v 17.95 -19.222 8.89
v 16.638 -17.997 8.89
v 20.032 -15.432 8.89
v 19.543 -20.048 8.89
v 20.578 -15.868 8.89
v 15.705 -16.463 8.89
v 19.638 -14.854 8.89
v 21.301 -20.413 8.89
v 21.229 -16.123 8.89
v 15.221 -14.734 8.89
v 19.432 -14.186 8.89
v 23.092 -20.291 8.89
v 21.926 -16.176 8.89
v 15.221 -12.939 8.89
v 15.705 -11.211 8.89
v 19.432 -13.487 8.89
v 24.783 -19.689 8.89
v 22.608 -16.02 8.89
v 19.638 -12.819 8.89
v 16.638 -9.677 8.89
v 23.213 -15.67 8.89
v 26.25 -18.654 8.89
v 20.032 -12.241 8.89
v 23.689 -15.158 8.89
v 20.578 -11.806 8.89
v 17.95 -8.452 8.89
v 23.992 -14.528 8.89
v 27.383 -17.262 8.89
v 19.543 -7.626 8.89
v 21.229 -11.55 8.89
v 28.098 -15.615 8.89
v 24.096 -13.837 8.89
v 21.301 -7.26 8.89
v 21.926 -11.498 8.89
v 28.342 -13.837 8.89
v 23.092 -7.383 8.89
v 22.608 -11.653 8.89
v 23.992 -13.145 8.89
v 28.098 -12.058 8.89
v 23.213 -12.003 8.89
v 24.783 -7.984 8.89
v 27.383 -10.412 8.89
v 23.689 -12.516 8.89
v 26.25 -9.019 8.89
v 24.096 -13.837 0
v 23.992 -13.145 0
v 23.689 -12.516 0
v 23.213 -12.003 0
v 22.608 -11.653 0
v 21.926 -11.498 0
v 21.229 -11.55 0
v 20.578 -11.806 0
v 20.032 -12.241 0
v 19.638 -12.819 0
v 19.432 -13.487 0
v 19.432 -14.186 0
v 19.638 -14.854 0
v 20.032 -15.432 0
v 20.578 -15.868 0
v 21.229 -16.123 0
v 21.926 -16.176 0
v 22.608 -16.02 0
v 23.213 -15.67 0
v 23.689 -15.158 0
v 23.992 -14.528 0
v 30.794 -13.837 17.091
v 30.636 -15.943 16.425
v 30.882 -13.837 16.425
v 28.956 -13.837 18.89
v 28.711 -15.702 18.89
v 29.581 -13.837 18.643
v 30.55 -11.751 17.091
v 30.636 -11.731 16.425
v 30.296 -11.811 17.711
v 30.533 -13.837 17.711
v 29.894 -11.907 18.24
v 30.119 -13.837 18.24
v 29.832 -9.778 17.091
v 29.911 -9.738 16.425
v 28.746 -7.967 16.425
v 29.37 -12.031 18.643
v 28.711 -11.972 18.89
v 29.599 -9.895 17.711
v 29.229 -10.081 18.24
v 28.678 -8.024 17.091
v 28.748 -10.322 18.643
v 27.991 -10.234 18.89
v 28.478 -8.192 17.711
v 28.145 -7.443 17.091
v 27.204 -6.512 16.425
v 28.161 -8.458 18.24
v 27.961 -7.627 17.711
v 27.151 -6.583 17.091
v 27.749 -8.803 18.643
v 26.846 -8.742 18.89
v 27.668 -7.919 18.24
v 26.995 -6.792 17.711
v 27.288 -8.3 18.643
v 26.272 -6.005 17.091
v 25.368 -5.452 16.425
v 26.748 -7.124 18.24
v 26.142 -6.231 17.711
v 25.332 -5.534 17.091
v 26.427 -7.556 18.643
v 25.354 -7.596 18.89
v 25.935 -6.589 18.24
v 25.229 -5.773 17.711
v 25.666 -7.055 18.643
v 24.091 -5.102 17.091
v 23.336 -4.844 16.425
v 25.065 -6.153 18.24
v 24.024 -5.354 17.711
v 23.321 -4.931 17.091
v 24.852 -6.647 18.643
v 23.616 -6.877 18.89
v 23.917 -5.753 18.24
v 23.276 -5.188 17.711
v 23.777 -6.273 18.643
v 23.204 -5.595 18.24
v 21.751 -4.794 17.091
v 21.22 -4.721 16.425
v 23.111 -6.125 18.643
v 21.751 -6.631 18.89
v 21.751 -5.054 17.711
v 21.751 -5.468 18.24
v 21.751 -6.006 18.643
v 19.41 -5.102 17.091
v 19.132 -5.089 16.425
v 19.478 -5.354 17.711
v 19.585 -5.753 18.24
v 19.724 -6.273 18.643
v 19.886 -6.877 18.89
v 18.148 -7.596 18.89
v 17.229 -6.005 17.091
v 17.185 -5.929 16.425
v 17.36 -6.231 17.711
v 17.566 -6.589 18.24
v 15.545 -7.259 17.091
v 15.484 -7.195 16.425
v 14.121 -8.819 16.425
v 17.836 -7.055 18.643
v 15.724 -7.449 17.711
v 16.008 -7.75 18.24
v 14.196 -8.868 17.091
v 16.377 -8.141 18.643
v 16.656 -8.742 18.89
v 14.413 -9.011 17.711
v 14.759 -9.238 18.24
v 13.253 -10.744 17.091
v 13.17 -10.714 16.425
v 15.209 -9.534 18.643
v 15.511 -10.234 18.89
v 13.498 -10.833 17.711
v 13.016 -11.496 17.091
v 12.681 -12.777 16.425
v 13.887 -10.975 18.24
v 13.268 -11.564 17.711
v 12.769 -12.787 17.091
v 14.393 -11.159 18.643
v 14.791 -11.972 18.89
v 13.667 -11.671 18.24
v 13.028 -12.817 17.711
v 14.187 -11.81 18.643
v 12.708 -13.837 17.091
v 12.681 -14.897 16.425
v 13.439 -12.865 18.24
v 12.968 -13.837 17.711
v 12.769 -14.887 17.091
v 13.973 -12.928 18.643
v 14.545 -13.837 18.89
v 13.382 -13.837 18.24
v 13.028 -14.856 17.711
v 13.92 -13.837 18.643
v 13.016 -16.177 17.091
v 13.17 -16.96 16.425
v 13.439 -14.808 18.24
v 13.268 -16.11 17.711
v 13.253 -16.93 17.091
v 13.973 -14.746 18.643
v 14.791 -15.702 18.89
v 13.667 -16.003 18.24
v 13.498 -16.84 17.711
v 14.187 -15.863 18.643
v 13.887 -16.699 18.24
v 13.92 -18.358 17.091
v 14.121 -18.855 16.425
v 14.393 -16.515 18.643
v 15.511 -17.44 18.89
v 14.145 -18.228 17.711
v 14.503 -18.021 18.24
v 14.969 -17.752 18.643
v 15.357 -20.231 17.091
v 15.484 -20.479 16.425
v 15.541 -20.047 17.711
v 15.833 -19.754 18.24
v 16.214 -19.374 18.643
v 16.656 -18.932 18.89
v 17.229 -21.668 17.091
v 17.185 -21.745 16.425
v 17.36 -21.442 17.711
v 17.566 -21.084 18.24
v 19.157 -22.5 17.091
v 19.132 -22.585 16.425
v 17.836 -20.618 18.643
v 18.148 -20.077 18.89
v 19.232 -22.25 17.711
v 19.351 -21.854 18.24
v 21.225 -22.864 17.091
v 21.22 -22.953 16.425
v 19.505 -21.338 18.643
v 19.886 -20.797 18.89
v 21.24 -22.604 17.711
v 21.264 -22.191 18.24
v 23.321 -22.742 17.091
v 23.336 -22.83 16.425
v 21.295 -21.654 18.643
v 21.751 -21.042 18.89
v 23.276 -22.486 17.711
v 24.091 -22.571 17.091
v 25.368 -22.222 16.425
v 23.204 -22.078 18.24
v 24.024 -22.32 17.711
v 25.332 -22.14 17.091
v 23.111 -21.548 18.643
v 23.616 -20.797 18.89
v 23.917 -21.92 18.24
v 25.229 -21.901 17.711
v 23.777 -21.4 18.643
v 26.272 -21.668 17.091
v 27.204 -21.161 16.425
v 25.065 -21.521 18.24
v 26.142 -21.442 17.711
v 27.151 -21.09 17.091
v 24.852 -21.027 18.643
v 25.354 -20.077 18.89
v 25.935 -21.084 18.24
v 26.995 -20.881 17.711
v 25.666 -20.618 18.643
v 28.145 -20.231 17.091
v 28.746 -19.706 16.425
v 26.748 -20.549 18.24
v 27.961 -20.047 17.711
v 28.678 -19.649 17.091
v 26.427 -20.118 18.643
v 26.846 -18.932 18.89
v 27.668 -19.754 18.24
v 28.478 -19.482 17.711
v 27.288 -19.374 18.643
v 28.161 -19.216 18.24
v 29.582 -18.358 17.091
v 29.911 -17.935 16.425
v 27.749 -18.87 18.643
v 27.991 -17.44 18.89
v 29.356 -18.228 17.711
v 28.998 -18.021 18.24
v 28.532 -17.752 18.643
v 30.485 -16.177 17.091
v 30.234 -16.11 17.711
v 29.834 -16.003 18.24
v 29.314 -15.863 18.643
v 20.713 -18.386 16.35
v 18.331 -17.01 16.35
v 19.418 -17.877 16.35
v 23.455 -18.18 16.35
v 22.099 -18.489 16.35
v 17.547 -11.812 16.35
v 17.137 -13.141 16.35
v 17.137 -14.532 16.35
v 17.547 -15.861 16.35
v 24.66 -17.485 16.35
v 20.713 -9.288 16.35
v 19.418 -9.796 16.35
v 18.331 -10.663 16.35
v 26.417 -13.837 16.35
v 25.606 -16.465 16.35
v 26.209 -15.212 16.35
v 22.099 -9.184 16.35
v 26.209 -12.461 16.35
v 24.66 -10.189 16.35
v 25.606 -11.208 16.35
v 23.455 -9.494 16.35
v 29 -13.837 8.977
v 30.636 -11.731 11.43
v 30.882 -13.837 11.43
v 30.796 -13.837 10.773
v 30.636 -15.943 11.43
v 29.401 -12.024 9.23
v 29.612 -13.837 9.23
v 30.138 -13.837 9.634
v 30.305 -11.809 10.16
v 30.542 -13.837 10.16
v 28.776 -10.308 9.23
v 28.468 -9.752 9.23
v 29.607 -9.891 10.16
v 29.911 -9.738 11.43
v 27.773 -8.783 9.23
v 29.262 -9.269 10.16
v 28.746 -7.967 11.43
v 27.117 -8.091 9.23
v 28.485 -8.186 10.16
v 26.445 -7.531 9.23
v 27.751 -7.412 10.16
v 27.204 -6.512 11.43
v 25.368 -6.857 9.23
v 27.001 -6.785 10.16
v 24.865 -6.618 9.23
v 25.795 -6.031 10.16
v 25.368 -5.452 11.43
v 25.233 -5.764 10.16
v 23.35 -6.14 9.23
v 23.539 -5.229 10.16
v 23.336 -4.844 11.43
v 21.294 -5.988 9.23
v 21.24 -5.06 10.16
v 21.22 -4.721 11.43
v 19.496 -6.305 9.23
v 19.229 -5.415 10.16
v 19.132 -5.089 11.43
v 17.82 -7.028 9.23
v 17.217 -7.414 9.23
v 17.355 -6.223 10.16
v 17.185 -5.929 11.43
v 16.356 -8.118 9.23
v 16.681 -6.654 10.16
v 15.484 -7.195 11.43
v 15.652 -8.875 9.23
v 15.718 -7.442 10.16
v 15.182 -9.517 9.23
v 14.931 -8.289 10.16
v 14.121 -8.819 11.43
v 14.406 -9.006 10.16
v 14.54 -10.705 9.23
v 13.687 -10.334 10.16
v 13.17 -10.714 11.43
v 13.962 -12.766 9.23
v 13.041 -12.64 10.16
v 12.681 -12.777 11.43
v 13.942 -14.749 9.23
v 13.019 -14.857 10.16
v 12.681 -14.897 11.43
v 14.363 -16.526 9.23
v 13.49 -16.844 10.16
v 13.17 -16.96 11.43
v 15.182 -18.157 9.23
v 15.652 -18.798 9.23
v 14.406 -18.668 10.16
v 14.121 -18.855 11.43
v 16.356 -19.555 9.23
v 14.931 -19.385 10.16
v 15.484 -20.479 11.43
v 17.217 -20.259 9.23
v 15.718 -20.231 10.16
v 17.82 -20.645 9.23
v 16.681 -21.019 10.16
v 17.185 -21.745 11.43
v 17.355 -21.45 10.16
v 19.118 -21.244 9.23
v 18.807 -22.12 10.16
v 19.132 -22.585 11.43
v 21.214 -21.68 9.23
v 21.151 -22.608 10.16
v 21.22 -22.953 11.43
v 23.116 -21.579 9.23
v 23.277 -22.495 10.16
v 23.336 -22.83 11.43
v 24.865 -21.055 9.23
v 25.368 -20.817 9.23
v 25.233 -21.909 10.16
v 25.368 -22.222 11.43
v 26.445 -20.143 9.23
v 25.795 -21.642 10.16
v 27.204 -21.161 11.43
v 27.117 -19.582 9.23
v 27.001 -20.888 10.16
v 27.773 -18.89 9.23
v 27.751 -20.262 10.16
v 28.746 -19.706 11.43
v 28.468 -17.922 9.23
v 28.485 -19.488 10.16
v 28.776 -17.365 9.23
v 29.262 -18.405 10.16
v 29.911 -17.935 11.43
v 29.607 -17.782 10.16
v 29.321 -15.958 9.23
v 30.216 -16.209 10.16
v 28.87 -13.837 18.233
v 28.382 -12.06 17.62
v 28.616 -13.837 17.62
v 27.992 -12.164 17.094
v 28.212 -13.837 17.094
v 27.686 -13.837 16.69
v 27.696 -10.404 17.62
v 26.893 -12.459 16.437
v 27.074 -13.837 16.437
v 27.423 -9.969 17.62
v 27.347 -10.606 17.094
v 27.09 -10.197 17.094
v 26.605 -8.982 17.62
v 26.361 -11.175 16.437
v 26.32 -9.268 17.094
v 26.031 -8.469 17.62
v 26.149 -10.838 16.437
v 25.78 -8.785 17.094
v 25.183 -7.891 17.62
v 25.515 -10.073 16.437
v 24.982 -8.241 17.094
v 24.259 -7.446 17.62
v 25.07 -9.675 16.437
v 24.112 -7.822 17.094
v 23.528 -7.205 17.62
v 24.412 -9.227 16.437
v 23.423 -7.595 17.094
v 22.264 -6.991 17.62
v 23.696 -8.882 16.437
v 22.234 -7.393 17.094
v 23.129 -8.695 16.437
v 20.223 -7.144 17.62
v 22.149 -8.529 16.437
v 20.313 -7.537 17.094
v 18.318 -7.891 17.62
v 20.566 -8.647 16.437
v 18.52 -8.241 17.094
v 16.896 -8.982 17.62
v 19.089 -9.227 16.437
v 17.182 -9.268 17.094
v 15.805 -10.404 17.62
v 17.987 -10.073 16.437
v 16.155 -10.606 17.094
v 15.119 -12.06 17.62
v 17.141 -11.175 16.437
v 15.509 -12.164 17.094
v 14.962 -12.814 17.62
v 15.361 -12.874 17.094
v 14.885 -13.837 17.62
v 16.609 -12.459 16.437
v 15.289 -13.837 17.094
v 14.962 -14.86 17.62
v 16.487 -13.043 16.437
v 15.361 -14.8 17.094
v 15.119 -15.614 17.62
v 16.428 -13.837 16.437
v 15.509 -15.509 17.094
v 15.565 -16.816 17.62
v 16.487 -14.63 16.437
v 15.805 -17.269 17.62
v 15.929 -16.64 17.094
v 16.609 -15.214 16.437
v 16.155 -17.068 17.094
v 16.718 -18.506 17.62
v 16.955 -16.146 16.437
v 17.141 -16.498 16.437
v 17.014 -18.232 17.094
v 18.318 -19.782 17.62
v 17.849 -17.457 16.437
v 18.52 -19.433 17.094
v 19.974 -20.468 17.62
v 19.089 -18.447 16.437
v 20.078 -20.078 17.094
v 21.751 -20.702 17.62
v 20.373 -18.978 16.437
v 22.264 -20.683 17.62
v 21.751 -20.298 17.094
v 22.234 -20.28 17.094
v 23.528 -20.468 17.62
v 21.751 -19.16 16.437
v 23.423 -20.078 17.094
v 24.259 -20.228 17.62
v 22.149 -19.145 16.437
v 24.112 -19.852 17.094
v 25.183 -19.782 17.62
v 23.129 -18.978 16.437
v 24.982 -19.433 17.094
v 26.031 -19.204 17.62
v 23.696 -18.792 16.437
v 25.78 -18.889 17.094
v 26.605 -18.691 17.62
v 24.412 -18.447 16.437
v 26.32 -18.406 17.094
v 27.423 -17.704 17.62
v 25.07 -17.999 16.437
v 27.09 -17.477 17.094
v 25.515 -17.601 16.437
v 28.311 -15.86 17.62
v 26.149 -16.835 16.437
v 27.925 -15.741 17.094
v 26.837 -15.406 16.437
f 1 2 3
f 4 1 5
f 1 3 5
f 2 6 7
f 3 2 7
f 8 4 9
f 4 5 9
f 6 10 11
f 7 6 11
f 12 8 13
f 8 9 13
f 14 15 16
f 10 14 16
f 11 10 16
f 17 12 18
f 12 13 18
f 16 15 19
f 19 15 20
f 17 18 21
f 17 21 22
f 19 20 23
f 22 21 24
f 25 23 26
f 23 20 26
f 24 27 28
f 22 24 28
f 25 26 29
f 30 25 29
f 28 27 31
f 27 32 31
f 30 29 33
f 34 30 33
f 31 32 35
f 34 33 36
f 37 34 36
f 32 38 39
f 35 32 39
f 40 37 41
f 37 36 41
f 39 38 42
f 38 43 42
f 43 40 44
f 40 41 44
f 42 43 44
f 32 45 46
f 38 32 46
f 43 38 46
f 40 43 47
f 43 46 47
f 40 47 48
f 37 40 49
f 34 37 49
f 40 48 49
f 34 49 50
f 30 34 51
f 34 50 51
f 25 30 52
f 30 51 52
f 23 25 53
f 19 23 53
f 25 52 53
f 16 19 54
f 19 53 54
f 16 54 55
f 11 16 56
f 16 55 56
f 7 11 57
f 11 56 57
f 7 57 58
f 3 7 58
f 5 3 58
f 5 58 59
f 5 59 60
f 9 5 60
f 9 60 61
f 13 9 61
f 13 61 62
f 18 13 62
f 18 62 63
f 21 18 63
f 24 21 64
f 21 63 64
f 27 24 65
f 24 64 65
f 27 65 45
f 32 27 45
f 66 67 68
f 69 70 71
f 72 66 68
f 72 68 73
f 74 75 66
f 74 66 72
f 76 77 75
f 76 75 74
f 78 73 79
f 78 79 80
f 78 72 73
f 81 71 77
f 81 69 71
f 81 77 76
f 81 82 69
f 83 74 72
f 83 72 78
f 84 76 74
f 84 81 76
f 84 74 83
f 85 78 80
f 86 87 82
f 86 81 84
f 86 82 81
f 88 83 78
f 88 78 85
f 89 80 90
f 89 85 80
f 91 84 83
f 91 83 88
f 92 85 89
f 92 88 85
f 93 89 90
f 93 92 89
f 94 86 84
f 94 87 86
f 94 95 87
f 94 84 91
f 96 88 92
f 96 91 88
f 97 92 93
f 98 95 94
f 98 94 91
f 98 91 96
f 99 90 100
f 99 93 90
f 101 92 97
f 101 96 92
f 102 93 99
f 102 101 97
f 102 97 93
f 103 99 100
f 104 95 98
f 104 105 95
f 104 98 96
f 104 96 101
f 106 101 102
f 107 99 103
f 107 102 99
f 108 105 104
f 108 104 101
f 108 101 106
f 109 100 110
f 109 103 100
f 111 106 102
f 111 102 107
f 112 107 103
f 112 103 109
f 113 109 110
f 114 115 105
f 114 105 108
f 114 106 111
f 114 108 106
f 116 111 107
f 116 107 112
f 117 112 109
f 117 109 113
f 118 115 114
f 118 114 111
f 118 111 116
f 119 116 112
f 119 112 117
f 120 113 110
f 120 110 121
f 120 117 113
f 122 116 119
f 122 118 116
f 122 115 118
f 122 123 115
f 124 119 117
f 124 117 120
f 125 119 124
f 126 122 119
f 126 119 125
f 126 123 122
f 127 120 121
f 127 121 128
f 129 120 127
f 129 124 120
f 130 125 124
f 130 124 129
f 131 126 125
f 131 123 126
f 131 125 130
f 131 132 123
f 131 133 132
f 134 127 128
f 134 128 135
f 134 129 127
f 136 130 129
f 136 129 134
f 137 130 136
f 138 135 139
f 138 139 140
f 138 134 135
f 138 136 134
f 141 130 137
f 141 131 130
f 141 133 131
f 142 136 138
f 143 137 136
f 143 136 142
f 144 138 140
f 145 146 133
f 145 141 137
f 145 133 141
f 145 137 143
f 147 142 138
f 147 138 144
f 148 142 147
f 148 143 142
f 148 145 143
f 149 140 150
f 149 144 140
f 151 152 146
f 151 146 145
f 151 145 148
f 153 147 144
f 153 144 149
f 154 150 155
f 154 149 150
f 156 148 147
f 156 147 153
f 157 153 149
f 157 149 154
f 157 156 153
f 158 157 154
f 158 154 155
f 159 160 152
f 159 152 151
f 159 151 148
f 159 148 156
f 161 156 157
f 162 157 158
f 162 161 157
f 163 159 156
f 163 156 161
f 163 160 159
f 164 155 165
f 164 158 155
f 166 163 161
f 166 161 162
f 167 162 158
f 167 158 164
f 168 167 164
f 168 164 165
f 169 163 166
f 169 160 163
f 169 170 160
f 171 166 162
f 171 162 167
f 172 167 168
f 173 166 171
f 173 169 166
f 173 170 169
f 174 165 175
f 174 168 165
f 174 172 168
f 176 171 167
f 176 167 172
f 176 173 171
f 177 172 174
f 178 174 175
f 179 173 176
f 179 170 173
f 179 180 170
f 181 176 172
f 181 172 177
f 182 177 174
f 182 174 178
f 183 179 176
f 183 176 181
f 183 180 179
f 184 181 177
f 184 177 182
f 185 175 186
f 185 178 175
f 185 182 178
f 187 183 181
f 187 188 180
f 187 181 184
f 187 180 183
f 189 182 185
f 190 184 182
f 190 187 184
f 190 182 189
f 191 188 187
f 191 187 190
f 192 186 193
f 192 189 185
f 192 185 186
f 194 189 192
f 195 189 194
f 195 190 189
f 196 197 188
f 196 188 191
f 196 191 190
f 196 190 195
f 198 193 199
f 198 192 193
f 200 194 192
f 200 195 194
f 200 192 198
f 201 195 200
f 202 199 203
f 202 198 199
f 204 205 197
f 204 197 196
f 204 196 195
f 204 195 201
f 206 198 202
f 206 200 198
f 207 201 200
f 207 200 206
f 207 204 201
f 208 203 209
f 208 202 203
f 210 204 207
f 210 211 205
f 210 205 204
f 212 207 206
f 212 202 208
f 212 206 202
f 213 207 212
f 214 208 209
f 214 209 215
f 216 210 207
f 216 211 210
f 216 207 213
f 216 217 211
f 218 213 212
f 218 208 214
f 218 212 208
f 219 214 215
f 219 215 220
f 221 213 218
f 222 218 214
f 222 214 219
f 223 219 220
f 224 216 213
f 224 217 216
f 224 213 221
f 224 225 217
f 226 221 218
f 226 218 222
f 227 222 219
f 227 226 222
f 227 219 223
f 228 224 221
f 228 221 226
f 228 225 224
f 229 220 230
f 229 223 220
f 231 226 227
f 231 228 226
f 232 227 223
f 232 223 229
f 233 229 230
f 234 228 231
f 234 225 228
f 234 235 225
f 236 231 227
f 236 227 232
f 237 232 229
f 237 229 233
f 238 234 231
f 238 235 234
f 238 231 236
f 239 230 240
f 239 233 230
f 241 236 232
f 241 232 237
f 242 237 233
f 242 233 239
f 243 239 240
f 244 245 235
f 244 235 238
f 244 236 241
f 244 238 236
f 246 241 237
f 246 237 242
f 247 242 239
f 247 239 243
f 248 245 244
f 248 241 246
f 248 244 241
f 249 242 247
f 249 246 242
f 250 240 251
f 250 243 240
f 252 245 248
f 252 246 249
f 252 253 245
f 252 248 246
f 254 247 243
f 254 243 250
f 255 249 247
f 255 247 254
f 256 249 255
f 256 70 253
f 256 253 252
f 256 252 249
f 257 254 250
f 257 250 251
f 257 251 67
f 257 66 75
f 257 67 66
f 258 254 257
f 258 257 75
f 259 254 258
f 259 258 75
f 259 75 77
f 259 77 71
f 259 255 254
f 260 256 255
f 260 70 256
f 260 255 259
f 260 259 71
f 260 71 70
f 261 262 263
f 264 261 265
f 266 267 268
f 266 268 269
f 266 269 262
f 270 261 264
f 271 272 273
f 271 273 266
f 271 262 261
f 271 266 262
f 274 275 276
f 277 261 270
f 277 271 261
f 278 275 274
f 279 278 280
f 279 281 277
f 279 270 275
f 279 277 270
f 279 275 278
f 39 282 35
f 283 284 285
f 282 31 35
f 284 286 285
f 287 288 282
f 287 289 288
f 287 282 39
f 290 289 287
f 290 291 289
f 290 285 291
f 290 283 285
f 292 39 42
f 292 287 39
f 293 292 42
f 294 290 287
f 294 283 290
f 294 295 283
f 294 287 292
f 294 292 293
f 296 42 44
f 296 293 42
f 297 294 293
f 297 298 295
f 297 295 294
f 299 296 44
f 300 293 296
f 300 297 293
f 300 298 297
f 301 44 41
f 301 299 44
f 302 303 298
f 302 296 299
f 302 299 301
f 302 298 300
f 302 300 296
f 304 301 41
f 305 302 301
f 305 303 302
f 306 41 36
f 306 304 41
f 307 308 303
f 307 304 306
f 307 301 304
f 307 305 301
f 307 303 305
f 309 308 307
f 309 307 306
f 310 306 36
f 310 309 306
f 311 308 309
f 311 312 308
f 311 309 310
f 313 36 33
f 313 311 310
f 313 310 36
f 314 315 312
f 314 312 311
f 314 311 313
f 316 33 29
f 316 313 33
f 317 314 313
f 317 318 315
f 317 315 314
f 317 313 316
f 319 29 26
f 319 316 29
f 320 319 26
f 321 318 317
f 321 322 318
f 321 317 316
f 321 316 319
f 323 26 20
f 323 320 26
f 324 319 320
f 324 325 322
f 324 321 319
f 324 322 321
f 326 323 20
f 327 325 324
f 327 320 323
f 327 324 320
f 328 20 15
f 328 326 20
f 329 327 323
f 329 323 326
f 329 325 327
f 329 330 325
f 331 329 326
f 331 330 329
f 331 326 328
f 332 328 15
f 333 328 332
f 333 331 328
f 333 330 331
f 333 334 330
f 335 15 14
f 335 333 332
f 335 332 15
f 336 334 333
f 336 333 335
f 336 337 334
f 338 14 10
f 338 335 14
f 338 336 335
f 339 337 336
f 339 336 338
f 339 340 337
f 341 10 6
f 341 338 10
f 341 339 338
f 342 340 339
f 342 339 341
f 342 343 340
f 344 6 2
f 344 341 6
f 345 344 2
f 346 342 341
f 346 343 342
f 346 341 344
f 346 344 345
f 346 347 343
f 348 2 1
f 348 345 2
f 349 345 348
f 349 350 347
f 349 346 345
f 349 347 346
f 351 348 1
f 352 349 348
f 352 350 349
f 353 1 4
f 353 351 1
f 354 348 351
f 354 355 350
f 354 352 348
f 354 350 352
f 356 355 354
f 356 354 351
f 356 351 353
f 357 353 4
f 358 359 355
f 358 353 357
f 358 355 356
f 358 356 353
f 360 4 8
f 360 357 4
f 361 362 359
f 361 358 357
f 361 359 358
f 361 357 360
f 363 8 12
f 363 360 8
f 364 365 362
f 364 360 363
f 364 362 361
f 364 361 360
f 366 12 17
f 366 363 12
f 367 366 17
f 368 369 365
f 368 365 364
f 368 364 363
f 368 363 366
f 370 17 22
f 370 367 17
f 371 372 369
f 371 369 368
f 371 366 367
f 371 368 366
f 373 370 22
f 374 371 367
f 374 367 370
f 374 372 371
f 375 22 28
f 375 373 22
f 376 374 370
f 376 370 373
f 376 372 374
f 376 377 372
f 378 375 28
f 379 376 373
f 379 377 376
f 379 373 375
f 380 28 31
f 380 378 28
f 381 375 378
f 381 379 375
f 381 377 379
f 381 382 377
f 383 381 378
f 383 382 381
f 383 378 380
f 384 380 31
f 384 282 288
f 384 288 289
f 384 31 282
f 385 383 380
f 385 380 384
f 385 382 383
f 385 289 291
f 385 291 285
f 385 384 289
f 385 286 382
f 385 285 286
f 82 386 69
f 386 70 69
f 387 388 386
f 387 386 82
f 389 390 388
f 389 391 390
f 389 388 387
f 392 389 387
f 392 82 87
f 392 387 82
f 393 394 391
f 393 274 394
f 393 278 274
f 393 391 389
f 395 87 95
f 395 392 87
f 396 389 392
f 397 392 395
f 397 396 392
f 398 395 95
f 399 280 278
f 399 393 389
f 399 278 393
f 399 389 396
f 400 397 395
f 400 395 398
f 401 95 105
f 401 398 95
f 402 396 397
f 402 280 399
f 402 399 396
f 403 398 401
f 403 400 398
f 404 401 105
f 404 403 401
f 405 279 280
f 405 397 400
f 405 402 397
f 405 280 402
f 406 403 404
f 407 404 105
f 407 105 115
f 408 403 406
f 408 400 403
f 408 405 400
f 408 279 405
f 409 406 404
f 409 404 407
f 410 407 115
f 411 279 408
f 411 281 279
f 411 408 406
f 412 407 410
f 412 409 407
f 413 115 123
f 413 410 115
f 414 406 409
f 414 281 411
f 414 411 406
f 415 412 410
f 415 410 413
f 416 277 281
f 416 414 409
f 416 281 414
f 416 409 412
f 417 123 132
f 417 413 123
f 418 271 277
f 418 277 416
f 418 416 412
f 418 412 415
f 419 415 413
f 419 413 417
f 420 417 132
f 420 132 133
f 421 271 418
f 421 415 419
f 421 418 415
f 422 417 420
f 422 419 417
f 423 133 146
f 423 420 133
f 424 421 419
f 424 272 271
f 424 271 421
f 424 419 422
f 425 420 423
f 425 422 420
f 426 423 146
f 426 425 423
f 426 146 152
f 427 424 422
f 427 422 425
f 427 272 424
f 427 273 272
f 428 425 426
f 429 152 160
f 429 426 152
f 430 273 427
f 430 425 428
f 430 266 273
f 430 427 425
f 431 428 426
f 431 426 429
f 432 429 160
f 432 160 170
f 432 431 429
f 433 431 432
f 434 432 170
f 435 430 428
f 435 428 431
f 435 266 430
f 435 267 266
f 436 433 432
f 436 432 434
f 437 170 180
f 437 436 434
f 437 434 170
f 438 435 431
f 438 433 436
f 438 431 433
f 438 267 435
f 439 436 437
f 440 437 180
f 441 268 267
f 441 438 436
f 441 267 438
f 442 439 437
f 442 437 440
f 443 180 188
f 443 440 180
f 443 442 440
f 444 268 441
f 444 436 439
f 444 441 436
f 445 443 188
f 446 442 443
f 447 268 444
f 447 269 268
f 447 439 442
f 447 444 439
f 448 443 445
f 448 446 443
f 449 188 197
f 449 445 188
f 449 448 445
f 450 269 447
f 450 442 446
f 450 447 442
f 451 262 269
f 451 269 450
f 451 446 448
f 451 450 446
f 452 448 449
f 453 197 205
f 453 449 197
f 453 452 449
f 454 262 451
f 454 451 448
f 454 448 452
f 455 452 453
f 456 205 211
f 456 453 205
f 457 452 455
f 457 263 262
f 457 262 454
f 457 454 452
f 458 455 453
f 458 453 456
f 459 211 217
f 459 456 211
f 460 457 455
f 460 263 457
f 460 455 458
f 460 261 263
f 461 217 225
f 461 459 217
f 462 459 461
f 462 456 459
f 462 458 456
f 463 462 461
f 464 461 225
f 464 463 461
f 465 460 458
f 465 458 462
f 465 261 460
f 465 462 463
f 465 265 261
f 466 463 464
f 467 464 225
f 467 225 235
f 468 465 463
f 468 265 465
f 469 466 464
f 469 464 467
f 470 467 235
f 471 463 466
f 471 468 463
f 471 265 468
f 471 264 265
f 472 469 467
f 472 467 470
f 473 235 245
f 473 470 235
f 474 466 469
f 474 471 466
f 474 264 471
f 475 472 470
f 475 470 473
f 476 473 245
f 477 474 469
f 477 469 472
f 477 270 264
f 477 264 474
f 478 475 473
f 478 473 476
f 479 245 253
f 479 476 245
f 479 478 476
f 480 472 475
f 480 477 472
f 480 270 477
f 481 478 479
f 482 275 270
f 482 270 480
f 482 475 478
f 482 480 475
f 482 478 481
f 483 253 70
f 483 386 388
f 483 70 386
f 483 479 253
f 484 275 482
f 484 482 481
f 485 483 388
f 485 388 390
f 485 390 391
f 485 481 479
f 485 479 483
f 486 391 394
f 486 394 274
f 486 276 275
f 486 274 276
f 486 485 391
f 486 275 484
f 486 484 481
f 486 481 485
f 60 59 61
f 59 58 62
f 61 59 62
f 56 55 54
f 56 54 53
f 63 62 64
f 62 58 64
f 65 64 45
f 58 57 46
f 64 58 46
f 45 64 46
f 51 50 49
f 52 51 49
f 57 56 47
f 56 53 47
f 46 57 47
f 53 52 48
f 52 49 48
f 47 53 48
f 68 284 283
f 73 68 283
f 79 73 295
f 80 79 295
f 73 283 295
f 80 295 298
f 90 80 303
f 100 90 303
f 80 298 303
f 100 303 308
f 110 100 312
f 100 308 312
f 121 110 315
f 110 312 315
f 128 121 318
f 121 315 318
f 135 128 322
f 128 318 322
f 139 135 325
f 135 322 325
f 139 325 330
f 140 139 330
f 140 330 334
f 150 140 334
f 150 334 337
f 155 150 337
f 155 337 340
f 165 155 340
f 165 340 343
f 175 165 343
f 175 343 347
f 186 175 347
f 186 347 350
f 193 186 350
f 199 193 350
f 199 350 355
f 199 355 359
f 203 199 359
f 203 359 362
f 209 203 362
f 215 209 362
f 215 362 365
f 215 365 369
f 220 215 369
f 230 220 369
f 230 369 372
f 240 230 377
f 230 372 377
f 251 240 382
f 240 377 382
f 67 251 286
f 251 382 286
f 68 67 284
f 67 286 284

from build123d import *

# Parameters (mm, degrees)
SKETCH1_R           = 2.345368149
BOSS_EXTRUDE1_DEPTH = 8.89
SKETCH2_R           = 9.131634977
BOSS_EXTRUDE2_DEPTH = 10
SKETCH3_R           = 7.205640658
CUT_EXTRUDE1_DEPTH  = 2.54
FILLET1_R           = 2.54
FILLET2_R           = 2.54


# Some blends are built 0.0001 mm under size
with BuildPart() as part:
    # Sketch1 → Boss-Extrude1 (new body)
    with BuildSketch(Plane.XY):
        with Locations((21.750777604, -13.836740686)):
            Circle(SKETCH1_R)
    extrude(amount=BOSS_EXTRUDE1_DEPTH)

    # Sketch2 → Boss-Extrude2 (add)
    with BuildSketch(Plane.XY.offset(8.89)):
        with Locations((21.750777604, -13.836740686)):
            Circle(SKETCH2_R)
    extrude(amount=BOSS_EXTRUDE2_DEPTH)

    # Sketch3 → Cut-Extrude1 (cut)
    with BuildSketch(Plane.XY.offset(18.89)):
        with Locations((21.750777604, -13.836740686)):
            Circle(SKETCH3_R)
    extrude(amount=-CUT_EXTRUDE1_DEPTH, mode=Mode.SUBTRACT)

    # Fillet1
    fillet1_edges = [part.edges().sort_by_distance(p)[0] for p in [
        (14.545136946, -13.836740686, 16.35),
    ]]
    fillet(fillet1_edges, radius=FILLET1_R - 0.0001)  # a hair under: the kernel refuses the full size

    # Fillet2
    # the kernel refuses this fillet: 2.54 mm, written as the material it takes off along each edge
    with BuildSketch(Plane(origin=(21.750777604, -13.836740686, 8.89), x_dir=(1, 0, 0), z_dir=(0, -1, 0))) as fillet2_piece_1:
        with BuildLine():
            CenterArc((9.131634977 - FILLET2_R, FILLET2_R), FILLET2_R, 270, 90)
            Line((9.131634977 - FILLET2_R, 0), (9.131634977 - FILLET2_R, -FILLET2_R * 0.02))
            Line((9.131634977 - FILLET2_R, -FILLET2_R * 0.02), (9.131634977 + FILLET2_R * 0.02, -FILLET2_R * 0.02))
            Line((9.131634977 + FILLET2_R * 0.02, -FILLET2_R * 0.02), (9.131634977 + FILLET2_R * 0.02, FILLET2_R))
            Line((9.131634977 + FILLET2_R * 0.02, FILLET2_R), (9.131634977, FILLET2_R))
        make_face()
    revolve(axis=Axis((21.750777604, -13.836740686, 8.89), (0, 0, 1)), mode=Mode.SUBTRACT)
    with BuildSketch(Plane(origin=(21.750777604, -13.836740686, 18.89), x_dir=(1, 0, 0), z_dir=(0, -1, 0))) as fillet2_piece_2:
        with BuildLine():
            CenterArc((6.591634977, -2.46466976), FILLET2_R, 0, 76.011064225)
            Line((9.131634977, -2.46466976), (9.182434977, -2.46466976))
            Line((9.182434977, -2.46466976), (9.182434977, 0))
            Line((9.182434977, 0), (9.131634977, 0.0508))
            ThreePointArc((9.131634977, 0.0508), (8.168637817, 0.0508), (7.217920771, 0.049293395))
            Line((7.217920771, 0.049293395), (7.205640658, 0))
        make_face()
    revolve(axis=Axis((21.750777604, -13.836740686, 18.89), (0, 0, 1)), mode=Mode.SUBTRACT)


solid = part.part
